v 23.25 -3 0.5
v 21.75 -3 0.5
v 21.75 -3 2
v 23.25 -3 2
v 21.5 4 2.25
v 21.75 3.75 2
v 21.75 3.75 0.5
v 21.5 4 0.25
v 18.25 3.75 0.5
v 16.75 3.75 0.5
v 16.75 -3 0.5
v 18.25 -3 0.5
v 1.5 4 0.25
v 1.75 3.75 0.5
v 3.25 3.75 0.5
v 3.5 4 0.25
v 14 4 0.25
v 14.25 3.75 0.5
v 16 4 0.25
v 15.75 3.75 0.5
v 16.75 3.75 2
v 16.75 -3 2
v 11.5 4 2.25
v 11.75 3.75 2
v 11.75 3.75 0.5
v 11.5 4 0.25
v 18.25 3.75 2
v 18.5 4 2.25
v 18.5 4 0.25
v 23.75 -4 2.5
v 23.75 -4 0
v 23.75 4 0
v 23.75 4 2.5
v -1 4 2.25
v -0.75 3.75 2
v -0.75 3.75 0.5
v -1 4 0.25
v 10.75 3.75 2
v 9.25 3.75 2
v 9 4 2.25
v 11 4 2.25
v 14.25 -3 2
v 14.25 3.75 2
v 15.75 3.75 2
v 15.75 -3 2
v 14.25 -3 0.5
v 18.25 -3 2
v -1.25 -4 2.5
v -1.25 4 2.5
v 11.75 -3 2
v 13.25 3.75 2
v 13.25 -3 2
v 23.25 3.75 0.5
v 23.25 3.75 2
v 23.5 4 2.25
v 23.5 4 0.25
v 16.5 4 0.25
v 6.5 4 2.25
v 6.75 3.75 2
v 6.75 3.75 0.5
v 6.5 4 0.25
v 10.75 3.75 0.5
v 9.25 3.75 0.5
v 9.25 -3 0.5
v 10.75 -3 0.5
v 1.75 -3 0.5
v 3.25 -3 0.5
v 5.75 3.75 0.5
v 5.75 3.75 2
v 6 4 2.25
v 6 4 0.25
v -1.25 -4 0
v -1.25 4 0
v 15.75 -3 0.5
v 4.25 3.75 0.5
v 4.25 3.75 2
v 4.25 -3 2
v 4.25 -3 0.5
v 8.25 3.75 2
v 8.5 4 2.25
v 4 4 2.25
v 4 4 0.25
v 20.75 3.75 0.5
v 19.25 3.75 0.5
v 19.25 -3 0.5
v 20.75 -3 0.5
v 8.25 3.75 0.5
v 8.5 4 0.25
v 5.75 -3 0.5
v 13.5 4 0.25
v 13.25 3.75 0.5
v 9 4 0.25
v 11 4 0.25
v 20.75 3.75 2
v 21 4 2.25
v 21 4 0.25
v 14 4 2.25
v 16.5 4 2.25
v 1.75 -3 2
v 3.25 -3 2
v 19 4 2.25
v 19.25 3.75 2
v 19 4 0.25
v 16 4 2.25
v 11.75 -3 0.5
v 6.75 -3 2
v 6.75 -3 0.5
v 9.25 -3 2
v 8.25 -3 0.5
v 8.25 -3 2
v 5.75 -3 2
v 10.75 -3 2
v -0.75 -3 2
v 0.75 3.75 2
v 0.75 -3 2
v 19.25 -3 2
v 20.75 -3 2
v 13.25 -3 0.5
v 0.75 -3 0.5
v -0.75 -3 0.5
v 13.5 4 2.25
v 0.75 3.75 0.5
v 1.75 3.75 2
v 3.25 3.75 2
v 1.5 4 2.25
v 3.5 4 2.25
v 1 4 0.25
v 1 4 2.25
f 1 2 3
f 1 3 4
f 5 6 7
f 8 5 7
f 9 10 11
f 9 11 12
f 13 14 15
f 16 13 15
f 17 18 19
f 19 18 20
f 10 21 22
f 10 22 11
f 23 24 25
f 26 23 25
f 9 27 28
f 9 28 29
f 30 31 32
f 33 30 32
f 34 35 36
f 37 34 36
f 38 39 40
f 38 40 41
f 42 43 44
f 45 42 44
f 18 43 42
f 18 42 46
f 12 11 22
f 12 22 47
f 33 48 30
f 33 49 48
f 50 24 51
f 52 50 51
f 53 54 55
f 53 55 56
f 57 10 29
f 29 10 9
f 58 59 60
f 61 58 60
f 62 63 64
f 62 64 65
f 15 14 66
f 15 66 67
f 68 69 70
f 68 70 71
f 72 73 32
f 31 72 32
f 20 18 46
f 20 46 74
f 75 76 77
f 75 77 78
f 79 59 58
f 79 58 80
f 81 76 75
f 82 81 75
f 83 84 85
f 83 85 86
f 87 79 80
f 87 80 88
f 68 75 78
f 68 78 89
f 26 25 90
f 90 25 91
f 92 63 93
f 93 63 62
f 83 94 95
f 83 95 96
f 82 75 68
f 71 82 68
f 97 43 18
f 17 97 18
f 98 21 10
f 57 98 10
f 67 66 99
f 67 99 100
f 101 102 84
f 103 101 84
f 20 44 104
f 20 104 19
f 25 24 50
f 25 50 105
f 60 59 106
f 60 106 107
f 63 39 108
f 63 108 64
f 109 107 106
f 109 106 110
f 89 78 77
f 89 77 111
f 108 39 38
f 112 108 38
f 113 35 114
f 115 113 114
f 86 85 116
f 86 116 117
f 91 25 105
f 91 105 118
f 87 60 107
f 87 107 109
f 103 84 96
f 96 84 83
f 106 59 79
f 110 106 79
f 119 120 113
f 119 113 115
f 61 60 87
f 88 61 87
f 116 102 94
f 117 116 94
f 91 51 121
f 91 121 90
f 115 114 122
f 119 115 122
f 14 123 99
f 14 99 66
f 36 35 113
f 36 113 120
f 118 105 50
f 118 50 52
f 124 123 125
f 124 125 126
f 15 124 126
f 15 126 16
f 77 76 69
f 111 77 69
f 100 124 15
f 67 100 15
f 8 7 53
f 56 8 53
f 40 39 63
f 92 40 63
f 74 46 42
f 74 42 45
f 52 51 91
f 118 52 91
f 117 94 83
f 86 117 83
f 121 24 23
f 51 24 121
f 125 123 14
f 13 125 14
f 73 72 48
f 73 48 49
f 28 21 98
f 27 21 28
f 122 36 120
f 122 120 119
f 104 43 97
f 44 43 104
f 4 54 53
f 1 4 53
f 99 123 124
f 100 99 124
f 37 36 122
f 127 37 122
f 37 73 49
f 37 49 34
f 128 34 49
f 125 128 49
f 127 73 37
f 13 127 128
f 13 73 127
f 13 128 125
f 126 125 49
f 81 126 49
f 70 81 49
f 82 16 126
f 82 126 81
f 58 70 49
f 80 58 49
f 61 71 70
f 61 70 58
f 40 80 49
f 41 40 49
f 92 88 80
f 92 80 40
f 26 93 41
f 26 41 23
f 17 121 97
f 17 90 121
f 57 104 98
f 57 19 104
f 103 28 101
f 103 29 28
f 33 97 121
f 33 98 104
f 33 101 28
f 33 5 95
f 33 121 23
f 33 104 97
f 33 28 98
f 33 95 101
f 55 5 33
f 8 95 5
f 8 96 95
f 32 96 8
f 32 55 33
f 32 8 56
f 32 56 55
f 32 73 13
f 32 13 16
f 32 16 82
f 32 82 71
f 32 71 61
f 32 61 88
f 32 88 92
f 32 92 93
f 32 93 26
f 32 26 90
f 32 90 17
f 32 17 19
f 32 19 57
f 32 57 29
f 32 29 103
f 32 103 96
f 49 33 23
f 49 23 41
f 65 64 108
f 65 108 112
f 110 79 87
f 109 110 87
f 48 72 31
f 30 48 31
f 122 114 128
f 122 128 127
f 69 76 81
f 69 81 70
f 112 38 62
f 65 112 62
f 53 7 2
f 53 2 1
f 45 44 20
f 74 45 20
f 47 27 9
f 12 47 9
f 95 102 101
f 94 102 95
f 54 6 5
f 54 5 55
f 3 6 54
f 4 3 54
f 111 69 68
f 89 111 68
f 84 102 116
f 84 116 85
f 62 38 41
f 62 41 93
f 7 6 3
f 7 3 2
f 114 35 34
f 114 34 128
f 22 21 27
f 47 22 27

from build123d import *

# Parameters (mm, degrees)
SKETCH1_W                  = 2.5
SKETCH1_H                  = 8
BOSS_EXTRUDE1_DEPTH        = 2.5
SKETCH2_W                  = 1.5
SKETCH2_H                  = 1.5
CUT_EXTRUDE2_DEPTH         = 7
CHAMFER3_SIZE              = 0.25
LPATTERN2_COUNT            = 10
LPATTERN2_PITCH            = 2.5
CHAMFER3_OF_LPATTERN2_SIZE = 0.25


with BuildPart() as part:
    # Sketch1 → Boss-Extrude1 (new body)
    with BuildSketch(Plane.XY):
        Rectangle(SKETCH1_W, SKETCH1_H)
    boss_extrude1 = extrude(amount=BOSS_EXTRUDE1_DEPTH)

    # Sketch2 → Cut-Extrude2 (cut)
    with BuildSketch(Plane(origin=(0, 4, 0), x_dir=(1, 0, 0), z_dir=(0, 1, 0))):
        with Locations((0, -1.25)):
            Rectangle(SKETCH2_W, SKETCH2_H)
    cut_extrude2 = extrude(amount=-CUT_EXTRUDE2_DEPTH, mode=Mode.SUBTRACT)

    # Chamfer3
    chamfer3_edges = [part.edges().sort_by_distance(p)[0] for p in [
        (0, 4, 2),
        (0.75, 4, 1.25),
        (0, 4, 0.5),
        (-0.75, 4, 1.25),
    ]]
    chamfer(chamfer3_edges, length=CHAMFER3_SIZE)

    # LPattern2: Boss-Extrude1, Cut-Extrude2 ×10
    with Locations(*[(i * LPATTERN2_PITCH, 0, 0) for i in range(1, LPATTERN2_COUNT)]):
        add(boss_extrude1)
        add(cut_extrude2, mode=Mode.SUBTRACT)

    # Chamfer3 of LPattern2
    chamfer3_of_lpattern2_edges = [part.edges().sort_by_distance(p)[0] for p in [
        (2.5, 4, 2),
        (3.25, 4, 1.25),
        (2.5, 4, 0.5),
        (1.75, 4, 1.25),
        (5, 4, 2),
        (5.75, 4, 1.25),
        (5, 4, 0.5),
        (4.25, 4, 1.25),
        (7.5, 4, 2),
        (8.25, 4, 1.25),
        (7.5, 4, 0.5),
        (6.75, 4, 1.25),
        (10, 4, 2),
        (10.75, 4, 1.25),
        (10, 4, 0.5),
        (9.25, 4, 1.25),
        (12.5, 4, 2),
        (13.25, 4, 1.25),
        (12.5, 4, 0.5),
        (11.75, 4, 1.25),
        (15, 4, 2),
        (15.75, 4, 1.25),
        (15, 4, 0.5),
        (14.25, 4, 1.25),
        (17.5, 4, 2),
        (18.25, 4, 1.25),
        (17.5, 4, 0.5),
        (16.75, 4, 1.25),
        (20, 4, 2),
        (20.75, 4, 1.25),
        (20, 4, 0.5),
        (19.25, 4, 1.25),
        (22.5, 4, 2),
        (23.25, 4, 1.25),
        (22.5, 4, 0.5),
        (21.75, 4, 1.25),
    ]]
    chamfer(chamfer3_of_lpattern2_edges, length=CHAMFER3_OF_LPATTERN2_SIZE)


solid = part.part
